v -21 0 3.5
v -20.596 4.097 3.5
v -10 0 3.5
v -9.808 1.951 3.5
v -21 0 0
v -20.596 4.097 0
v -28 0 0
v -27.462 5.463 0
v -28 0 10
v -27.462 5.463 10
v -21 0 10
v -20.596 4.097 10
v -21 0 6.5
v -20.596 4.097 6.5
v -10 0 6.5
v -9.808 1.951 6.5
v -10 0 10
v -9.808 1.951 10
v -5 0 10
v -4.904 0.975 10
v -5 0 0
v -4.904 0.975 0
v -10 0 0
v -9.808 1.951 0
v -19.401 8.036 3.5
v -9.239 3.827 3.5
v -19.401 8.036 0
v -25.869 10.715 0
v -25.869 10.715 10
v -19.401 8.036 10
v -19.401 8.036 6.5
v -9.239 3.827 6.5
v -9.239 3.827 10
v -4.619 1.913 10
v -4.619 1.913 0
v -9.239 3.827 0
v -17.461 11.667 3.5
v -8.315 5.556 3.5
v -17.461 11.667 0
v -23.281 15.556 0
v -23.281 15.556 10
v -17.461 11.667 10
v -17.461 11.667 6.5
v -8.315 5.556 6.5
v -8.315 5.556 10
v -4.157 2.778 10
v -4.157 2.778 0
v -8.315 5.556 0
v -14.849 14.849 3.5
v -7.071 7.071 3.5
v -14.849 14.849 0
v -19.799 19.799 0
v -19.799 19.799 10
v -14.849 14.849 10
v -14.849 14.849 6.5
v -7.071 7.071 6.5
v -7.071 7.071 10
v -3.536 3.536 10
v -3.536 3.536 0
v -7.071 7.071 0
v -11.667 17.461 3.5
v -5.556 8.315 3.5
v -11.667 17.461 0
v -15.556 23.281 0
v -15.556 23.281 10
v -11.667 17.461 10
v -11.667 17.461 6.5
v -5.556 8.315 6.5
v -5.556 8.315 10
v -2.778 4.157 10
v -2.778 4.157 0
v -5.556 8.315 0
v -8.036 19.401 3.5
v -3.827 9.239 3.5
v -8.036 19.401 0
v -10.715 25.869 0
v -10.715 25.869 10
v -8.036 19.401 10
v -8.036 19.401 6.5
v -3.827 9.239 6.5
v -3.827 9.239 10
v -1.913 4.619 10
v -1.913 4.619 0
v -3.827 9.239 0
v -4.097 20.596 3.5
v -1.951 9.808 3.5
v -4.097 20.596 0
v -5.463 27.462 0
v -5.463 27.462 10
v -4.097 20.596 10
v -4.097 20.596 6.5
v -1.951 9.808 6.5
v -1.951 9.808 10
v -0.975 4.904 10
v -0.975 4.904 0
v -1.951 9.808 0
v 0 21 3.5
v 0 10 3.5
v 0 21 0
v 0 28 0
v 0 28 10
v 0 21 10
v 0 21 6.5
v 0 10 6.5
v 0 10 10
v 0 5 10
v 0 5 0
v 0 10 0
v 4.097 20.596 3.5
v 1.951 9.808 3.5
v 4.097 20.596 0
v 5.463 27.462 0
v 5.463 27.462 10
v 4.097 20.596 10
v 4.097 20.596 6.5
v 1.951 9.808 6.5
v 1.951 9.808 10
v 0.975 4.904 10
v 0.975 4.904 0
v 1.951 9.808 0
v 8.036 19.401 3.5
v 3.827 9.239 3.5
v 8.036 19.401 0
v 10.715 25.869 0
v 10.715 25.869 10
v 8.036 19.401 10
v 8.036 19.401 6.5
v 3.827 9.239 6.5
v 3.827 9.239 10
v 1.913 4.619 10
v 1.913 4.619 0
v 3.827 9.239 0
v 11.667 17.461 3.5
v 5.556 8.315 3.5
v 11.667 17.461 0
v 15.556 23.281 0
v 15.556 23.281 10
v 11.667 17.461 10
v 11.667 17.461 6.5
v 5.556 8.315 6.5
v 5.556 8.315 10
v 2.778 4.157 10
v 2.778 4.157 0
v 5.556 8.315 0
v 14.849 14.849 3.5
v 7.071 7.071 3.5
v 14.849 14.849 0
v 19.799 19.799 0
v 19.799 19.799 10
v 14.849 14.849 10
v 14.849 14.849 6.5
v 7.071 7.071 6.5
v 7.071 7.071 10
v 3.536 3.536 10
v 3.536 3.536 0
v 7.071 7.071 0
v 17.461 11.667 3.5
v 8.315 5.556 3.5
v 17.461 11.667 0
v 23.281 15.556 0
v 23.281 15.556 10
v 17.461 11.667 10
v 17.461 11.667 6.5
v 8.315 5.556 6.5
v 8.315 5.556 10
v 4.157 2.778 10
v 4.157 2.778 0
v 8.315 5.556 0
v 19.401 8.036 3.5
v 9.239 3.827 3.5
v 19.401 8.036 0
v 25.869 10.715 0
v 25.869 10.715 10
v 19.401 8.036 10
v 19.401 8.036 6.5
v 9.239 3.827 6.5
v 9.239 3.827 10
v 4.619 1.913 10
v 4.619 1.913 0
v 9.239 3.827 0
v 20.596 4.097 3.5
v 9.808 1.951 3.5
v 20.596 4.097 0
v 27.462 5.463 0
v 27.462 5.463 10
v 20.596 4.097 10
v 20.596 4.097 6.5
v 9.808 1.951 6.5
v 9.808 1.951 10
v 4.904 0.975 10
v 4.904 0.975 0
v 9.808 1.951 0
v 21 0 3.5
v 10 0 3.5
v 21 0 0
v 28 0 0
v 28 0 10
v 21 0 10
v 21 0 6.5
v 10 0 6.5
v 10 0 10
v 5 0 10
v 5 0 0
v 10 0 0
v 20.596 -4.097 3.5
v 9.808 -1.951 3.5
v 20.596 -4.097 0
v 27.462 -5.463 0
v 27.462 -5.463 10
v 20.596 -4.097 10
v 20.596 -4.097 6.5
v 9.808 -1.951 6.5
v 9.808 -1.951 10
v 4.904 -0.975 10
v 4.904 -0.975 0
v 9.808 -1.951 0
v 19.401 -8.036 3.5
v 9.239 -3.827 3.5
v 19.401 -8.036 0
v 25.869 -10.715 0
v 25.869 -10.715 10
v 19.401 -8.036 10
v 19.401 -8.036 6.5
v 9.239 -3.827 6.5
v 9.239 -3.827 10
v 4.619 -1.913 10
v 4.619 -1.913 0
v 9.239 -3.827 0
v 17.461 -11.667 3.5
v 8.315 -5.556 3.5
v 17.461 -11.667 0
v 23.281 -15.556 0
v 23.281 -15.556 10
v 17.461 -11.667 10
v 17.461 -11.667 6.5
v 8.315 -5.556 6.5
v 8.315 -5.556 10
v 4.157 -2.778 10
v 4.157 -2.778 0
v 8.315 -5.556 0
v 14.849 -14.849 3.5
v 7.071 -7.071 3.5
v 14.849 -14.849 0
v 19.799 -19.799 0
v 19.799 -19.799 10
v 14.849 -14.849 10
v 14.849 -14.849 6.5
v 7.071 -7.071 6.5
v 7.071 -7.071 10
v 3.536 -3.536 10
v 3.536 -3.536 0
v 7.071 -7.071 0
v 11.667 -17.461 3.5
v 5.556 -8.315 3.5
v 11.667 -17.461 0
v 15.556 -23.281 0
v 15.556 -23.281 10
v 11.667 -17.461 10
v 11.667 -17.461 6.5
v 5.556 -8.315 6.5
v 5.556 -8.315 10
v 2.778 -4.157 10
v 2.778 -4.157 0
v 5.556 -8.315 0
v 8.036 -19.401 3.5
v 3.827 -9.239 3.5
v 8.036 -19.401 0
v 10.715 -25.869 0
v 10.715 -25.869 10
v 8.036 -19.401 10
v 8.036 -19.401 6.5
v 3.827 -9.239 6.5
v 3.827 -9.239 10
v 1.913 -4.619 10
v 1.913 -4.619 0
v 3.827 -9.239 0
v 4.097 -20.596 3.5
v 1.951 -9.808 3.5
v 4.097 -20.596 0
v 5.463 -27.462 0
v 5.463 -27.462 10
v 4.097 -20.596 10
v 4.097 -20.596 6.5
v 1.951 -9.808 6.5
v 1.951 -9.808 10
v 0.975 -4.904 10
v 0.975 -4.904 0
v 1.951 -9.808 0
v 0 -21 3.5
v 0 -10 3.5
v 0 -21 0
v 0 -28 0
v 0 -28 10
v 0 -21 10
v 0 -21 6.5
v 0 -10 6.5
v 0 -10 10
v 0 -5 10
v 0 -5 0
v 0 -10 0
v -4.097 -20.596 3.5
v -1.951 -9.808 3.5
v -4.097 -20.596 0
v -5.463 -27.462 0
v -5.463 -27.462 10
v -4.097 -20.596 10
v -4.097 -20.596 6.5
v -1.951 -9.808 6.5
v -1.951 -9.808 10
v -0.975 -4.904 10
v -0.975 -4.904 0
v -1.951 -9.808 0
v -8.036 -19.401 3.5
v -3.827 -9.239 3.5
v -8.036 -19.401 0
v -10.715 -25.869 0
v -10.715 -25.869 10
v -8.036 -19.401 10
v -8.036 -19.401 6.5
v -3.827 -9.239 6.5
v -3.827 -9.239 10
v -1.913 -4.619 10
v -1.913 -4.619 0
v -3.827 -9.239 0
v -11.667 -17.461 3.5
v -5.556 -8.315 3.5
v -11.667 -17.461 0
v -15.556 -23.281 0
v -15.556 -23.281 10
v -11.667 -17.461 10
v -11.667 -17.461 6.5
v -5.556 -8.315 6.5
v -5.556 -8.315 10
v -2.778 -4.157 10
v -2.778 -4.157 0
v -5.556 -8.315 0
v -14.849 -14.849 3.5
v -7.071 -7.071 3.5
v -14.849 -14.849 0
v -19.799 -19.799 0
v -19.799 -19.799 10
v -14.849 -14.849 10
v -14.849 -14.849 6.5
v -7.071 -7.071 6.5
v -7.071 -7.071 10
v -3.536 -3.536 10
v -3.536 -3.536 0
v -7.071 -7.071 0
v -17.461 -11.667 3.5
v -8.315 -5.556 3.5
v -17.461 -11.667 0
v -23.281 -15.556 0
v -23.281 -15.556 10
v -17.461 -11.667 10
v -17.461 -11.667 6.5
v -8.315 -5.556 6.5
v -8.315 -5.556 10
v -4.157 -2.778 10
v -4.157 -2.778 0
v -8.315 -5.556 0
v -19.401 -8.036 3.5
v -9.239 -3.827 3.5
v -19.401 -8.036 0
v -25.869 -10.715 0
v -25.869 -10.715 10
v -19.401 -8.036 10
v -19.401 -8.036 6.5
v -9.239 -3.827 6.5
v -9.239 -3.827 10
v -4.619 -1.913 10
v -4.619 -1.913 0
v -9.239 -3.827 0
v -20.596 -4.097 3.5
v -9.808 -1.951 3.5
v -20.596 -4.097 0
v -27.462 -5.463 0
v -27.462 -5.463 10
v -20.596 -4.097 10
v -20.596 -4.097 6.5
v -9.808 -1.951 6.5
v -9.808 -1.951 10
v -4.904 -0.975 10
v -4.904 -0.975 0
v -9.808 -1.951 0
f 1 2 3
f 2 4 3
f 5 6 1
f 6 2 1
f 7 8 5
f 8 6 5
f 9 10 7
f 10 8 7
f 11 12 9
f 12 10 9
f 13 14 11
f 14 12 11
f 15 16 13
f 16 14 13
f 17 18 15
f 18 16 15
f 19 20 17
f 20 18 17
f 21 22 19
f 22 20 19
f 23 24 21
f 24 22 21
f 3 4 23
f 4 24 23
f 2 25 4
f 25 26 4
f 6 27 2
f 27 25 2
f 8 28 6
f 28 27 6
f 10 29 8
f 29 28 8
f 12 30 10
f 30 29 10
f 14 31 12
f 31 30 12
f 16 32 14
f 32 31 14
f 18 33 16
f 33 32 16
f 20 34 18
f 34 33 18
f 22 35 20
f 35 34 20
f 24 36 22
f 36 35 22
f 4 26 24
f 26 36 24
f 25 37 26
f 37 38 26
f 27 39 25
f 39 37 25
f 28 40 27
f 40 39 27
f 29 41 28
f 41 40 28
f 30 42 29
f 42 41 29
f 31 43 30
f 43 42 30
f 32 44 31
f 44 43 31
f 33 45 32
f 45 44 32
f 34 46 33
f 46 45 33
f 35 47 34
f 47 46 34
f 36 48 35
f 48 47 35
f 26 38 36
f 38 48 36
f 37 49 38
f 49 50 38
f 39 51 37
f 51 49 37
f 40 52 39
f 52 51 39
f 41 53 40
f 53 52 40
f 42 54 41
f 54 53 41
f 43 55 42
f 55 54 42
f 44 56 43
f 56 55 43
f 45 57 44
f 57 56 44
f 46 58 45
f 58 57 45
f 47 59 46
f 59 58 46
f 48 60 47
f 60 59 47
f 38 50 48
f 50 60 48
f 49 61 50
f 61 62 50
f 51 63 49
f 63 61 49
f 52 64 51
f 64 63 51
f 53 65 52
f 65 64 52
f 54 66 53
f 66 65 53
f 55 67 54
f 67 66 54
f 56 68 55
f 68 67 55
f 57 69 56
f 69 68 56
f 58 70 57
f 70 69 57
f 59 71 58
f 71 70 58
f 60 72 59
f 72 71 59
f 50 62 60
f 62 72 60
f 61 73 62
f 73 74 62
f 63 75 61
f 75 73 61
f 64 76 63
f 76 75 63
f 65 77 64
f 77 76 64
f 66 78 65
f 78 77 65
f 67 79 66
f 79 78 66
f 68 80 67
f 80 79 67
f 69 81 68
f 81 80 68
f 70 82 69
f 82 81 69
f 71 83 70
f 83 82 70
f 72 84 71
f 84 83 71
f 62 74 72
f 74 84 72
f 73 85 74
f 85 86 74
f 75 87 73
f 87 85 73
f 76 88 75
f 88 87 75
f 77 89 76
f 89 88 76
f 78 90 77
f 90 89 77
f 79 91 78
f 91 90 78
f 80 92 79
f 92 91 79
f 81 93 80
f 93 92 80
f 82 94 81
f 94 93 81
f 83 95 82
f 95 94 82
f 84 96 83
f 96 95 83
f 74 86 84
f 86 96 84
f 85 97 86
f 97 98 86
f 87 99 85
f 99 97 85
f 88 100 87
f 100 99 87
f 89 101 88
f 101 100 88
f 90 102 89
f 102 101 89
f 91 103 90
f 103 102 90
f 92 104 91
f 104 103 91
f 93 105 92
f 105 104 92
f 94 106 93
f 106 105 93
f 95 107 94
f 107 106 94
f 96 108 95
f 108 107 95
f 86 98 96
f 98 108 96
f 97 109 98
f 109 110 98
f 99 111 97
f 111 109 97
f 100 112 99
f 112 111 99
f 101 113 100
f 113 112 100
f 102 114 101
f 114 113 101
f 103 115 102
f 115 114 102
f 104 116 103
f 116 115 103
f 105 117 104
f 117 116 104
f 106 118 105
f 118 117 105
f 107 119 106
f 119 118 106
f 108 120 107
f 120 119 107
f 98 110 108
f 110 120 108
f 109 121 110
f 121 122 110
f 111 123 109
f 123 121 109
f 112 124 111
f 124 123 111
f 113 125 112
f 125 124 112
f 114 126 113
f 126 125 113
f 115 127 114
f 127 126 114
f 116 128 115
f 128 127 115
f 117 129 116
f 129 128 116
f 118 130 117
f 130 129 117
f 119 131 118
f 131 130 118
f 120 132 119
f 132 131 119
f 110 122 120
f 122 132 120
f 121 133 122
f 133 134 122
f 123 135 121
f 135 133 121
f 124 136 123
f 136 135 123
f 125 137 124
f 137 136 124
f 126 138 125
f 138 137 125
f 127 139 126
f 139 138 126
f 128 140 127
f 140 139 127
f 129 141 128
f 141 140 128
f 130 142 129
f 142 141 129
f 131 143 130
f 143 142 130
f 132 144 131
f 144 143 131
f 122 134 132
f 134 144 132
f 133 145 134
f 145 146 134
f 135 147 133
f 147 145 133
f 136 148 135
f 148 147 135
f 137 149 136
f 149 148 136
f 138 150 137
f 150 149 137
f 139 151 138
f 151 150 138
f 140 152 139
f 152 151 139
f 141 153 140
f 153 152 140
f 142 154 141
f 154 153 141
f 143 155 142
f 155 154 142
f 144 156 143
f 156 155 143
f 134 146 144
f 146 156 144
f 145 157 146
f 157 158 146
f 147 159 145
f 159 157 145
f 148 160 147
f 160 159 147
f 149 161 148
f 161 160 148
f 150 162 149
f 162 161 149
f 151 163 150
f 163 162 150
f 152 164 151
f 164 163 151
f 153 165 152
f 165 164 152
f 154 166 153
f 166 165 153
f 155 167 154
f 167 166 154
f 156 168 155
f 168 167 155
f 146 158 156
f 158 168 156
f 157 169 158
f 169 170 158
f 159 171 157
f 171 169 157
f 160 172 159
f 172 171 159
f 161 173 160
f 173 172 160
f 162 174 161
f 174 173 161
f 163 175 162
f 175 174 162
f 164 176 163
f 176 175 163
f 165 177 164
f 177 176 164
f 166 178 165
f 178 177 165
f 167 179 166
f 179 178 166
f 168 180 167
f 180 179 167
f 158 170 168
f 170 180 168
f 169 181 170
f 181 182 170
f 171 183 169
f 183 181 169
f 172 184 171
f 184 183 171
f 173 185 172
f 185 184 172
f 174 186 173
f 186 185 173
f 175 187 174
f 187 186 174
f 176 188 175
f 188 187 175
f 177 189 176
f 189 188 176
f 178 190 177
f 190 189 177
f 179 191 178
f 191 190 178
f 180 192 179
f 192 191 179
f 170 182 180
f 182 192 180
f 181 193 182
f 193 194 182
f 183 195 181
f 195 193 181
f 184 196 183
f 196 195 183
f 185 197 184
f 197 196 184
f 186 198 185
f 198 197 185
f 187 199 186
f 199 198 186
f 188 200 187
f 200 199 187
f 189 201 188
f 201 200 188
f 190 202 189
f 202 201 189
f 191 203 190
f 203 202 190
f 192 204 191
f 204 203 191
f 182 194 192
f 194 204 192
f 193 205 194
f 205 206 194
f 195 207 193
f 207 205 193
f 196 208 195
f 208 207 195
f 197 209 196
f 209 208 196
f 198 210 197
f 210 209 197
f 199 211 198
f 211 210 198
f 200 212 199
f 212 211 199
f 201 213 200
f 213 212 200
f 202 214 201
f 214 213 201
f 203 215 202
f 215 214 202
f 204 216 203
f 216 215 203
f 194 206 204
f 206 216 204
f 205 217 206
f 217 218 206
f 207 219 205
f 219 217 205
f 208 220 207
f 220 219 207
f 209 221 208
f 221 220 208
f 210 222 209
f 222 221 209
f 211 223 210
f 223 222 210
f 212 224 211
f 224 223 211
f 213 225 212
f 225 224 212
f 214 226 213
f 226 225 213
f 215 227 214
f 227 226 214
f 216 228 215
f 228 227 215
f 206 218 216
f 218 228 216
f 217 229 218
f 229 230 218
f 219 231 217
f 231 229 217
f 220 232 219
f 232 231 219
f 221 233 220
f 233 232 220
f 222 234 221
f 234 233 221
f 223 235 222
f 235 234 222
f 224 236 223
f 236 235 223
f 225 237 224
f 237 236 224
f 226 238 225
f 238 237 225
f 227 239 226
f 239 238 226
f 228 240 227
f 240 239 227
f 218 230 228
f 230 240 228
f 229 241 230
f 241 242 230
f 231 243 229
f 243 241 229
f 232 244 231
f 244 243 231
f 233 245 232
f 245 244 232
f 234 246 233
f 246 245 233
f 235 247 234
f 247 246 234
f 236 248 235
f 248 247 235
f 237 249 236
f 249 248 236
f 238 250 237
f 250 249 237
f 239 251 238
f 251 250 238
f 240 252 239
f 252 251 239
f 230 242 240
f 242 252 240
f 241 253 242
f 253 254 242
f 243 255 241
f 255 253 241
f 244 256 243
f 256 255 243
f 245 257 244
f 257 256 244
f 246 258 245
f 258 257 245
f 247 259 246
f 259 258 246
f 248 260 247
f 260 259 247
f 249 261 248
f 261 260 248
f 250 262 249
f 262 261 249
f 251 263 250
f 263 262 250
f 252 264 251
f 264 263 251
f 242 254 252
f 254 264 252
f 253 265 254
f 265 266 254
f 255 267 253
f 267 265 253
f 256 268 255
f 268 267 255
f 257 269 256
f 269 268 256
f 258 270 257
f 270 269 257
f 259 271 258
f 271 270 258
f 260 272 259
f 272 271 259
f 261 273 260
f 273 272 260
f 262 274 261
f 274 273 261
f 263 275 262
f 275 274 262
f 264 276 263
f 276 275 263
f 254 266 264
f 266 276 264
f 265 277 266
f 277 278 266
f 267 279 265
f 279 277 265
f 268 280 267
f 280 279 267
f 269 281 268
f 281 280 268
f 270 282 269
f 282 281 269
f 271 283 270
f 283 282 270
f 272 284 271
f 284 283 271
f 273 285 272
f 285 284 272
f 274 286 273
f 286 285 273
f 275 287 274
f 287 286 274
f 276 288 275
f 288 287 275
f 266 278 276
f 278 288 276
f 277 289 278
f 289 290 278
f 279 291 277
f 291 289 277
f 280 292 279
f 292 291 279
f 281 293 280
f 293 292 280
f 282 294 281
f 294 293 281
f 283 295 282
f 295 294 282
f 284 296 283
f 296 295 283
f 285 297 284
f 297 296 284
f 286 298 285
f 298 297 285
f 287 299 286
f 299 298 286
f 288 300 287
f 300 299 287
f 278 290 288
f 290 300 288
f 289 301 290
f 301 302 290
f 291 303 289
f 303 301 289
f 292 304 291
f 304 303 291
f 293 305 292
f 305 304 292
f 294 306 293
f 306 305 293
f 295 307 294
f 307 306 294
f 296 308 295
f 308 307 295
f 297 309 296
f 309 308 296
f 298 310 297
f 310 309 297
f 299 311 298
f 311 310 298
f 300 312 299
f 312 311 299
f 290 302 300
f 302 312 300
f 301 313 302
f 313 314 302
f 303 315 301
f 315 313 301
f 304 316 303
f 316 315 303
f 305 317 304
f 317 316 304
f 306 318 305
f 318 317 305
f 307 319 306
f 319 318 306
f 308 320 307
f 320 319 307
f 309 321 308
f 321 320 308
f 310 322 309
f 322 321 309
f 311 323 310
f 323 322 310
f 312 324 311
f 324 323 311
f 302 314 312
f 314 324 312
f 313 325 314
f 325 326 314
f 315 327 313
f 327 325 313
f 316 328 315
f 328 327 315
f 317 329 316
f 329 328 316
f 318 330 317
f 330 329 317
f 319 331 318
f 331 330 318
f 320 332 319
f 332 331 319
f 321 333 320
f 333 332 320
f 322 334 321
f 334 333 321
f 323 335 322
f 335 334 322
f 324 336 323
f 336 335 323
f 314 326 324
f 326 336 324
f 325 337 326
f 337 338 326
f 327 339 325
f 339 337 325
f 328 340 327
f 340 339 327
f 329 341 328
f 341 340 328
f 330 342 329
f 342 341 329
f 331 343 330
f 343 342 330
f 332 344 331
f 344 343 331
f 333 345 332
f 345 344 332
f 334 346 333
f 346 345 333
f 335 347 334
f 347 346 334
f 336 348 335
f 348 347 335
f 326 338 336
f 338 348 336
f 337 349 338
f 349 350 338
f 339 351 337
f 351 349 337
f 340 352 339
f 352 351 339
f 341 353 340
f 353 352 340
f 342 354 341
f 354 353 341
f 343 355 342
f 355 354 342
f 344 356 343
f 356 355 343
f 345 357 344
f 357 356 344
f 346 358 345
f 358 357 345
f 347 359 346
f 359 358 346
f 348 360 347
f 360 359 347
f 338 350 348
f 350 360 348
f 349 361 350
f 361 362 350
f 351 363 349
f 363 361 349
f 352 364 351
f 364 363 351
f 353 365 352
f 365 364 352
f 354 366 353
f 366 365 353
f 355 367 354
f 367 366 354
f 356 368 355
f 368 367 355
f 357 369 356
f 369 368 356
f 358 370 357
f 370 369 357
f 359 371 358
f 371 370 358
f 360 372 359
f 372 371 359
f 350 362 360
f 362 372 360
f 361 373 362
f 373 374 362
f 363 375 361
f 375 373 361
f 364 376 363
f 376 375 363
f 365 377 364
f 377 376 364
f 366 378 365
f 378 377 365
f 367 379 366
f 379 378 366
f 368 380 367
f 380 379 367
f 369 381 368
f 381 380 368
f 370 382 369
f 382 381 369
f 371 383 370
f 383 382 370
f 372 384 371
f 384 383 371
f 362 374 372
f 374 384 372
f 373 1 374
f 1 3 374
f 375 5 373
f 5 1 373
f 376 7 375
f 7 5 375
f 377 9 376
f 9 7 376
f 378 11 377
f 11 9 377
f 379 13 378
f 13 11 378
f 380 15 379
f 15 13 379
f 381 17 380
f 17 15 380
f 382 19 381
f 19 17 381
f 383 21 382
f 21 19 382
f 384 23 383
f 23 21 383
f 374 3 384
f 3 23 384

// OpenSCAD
$fn = 32;

// ----------------------------------------------------------------------
// Revolved part: handwheel R28
// ----------------------------------------------------------------------

// --- parameters (mm) ---
bore_r = 5;               // bore radius
rim_r = 28;               // rim radius
rim_w = 7;                // rim axial width
rim_t = 10;               // rim diameter height
hub_r = 10;               // hub radius
web_t = 3;                // web thickness
revolve_angle = 360;      // revolve sweep, degrees

bore_d = 2 * bore_r;
rim_d = 2 * rim_r;
hub_d = 2 * hub_r;

profile = [[5, 0], [10, 0], [10, 3.5], [21, 3.5], [21, 0], [28, 0], [28, 10], [21, 10], [21, 6.5], [10, 6.5], [10, 10], [5, 10]];  // primary outline, 12 points, counter clockwise

// --- the one profile operation ---
rotate_extrude(angle = revolve_angle) polygon(points = profile);
